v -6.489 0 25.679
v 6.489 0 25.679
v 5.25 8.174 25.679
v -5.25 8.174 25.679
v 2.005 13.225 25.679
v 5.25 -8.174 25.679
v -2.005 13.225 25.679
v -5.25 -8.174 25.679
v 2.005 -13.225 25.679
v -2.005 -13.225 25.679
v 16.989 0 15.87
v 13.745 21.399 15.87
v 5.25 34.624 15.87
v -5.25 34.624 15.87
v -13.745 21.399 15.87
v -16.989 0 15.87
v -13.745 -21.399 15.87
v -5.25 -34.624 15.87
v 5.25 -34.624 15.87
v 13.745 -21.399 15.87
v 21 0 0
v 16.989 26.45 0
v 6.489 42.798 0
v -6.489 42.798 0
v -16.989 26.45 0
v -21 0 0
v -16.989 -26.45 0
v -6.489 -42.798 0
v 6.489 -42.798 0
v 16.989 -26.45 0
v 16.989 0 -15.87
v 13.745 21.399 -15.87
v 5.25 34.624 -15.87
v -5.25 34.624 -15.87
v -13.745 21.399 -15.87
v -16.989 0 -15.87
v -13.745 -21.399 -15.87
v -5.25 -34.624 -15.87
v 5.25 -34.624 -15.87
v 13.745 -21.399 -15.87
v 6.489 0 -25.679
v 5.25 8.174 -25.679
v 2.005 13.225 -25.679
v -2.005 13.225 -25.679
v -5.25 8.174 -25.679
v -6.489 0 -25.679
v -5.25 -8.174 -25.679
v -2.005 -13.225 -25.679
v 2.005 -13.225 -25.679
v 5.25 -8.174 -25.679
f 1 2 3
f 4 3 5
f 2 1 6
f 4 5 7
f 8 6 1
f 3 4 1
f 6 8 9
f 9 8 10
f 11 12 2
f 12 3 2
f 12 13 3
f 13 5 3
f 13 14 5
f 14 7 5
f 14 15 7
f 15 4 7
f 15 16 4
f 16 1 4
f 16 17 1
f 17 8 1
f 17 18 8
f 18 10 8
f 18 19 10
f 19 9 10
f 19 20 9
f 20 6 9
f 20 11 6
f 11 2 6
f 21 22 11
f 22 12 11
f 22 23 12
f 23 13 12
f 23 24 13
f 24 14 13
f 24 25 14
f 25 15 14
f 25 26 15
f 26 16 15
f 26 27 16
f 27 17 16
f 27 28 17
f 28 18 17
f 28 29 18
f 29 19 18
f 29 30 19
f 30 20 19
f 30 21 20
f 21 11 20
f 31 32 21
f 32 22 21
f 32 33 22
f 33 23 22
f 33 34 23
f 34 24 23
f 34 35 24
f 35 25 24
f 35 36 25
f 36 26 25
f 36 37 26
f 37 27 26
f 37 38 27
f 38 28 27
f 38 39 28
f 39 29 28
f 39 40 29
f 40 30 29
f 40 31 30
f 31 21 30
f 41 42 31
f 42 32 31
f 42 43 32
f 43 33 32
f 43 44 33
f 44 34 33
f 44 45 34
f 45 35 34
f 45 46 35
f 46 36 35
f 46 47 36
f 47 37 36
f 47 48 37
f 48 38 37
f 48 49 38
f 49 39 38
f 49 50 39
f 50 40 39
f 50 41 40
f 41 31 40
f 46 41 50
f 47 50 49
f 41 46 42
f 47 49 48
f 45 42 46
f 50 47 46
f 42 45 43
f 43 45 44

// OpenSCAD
// Generated by SolidPython 1.0.1 on 2020-07-29 00:46:48


scale(v = [7, 15, 9]) {
	sphere(r = 3);
}
/***********************************************
*********      SolidPython code:      **********
************************************************
 
# import packages: SolidPython
from solid import *
from solid.utils import *
from itertools import chain, combinations, permutations


class Resize:

    def __init__(self, scad_file):
        self.scad_file = scad_file
        #self.scad_file = import_scad(scad_file)
        # cone/cylinder param:
        self.r1 = 0
        self.r2 = 0
        self.h = 0
        # rectangular prism param:
        self.w = 0
        self.l = 0
        # ellipse param:
        self.r = 0

    # import OpenScad code (file name corresponds to shape)


    # classify shape + parameters
    def assign(self, param1, param2, param3):
        if self.scad_file == 'cone.scad':
            self.r1 = param1
            self.r2 = param2
            self.h = param3
        elif self.scad_file == 'cylinder.scad':
            self.r1 = param1
            self.r2 = param2
            self.h = param3
        elif self.scad_file == 'rectangularPrism.scad':
            self.h = param1
            self.l = param2
            self.w = param3
        else:
            self.r = param1
            self.h = param2

    # resize parameters
    def iterate(self):
        x = range(3, 20, 2)
        i = 1
        if self.scad_file == 'cone.scad':
            tempList = list(permutations(x, 2))
            for temp in tempList:
                param1 = temp[0]
                param2 = temp[1]
                filepath = 'produced_scad_files/' + 'cone' + str(param1) + '_' + str(param2) + '_' + '.scad'
                scad_render_to_file(cylinder(h=param1, r1=param2, r2=0), filepath)

        elif self.scad_file == 'cylinder.scad':
            tempList = list(permutations(x, 3))
            for temp in tempList:
                param1 = temp[0]
                param2 = temp[1]
                filepath = 'produced_scad_files/' + 'cylinder' + str(param1) + '_' + str(param2) + '_' + '.scad'
                scad_render_to_file(cylinder(h=param1, r1=param2, r2=param2), filepath)

        elif self.scad_file == 'rectangularPrism.scad':
            tempList = list(permutations(x, 3))
            for temp in tempList:
                param1 = temp[0]
                param2 = temp[1]
                param3 = temp[2]
                filepath = 'produced_scad_files/' + 'rectangularPrism' + str(param1) + '_' + str(param2) + '_' + str(
                    param3) + '.scad'
                scad_render_to_file(cube(size=(param1, param2, param3)), filepath)

        elif self.scad_file == 'ellipse.scad':
            tempList = list(permutations(x, 4))
            for temp in tempList:
                param1 = temp[0]
                param2 = temp[1]
                param3 = temp[2]
                param4 = temp[3]
                filepath = 'produced_scad_files/' + 'ellipse' + str(param1) + '_' + str(param2) + '_' + str(param3) + '_' + str(param4) + '.scad'
                scad_render_to_file(scale([param1, param2, param3])(sphere(r=param4)), filepath)

    def render_to_scadfile(self):
        scad_render_to_file(scad, 'example.scad') 
 
************************************************/
